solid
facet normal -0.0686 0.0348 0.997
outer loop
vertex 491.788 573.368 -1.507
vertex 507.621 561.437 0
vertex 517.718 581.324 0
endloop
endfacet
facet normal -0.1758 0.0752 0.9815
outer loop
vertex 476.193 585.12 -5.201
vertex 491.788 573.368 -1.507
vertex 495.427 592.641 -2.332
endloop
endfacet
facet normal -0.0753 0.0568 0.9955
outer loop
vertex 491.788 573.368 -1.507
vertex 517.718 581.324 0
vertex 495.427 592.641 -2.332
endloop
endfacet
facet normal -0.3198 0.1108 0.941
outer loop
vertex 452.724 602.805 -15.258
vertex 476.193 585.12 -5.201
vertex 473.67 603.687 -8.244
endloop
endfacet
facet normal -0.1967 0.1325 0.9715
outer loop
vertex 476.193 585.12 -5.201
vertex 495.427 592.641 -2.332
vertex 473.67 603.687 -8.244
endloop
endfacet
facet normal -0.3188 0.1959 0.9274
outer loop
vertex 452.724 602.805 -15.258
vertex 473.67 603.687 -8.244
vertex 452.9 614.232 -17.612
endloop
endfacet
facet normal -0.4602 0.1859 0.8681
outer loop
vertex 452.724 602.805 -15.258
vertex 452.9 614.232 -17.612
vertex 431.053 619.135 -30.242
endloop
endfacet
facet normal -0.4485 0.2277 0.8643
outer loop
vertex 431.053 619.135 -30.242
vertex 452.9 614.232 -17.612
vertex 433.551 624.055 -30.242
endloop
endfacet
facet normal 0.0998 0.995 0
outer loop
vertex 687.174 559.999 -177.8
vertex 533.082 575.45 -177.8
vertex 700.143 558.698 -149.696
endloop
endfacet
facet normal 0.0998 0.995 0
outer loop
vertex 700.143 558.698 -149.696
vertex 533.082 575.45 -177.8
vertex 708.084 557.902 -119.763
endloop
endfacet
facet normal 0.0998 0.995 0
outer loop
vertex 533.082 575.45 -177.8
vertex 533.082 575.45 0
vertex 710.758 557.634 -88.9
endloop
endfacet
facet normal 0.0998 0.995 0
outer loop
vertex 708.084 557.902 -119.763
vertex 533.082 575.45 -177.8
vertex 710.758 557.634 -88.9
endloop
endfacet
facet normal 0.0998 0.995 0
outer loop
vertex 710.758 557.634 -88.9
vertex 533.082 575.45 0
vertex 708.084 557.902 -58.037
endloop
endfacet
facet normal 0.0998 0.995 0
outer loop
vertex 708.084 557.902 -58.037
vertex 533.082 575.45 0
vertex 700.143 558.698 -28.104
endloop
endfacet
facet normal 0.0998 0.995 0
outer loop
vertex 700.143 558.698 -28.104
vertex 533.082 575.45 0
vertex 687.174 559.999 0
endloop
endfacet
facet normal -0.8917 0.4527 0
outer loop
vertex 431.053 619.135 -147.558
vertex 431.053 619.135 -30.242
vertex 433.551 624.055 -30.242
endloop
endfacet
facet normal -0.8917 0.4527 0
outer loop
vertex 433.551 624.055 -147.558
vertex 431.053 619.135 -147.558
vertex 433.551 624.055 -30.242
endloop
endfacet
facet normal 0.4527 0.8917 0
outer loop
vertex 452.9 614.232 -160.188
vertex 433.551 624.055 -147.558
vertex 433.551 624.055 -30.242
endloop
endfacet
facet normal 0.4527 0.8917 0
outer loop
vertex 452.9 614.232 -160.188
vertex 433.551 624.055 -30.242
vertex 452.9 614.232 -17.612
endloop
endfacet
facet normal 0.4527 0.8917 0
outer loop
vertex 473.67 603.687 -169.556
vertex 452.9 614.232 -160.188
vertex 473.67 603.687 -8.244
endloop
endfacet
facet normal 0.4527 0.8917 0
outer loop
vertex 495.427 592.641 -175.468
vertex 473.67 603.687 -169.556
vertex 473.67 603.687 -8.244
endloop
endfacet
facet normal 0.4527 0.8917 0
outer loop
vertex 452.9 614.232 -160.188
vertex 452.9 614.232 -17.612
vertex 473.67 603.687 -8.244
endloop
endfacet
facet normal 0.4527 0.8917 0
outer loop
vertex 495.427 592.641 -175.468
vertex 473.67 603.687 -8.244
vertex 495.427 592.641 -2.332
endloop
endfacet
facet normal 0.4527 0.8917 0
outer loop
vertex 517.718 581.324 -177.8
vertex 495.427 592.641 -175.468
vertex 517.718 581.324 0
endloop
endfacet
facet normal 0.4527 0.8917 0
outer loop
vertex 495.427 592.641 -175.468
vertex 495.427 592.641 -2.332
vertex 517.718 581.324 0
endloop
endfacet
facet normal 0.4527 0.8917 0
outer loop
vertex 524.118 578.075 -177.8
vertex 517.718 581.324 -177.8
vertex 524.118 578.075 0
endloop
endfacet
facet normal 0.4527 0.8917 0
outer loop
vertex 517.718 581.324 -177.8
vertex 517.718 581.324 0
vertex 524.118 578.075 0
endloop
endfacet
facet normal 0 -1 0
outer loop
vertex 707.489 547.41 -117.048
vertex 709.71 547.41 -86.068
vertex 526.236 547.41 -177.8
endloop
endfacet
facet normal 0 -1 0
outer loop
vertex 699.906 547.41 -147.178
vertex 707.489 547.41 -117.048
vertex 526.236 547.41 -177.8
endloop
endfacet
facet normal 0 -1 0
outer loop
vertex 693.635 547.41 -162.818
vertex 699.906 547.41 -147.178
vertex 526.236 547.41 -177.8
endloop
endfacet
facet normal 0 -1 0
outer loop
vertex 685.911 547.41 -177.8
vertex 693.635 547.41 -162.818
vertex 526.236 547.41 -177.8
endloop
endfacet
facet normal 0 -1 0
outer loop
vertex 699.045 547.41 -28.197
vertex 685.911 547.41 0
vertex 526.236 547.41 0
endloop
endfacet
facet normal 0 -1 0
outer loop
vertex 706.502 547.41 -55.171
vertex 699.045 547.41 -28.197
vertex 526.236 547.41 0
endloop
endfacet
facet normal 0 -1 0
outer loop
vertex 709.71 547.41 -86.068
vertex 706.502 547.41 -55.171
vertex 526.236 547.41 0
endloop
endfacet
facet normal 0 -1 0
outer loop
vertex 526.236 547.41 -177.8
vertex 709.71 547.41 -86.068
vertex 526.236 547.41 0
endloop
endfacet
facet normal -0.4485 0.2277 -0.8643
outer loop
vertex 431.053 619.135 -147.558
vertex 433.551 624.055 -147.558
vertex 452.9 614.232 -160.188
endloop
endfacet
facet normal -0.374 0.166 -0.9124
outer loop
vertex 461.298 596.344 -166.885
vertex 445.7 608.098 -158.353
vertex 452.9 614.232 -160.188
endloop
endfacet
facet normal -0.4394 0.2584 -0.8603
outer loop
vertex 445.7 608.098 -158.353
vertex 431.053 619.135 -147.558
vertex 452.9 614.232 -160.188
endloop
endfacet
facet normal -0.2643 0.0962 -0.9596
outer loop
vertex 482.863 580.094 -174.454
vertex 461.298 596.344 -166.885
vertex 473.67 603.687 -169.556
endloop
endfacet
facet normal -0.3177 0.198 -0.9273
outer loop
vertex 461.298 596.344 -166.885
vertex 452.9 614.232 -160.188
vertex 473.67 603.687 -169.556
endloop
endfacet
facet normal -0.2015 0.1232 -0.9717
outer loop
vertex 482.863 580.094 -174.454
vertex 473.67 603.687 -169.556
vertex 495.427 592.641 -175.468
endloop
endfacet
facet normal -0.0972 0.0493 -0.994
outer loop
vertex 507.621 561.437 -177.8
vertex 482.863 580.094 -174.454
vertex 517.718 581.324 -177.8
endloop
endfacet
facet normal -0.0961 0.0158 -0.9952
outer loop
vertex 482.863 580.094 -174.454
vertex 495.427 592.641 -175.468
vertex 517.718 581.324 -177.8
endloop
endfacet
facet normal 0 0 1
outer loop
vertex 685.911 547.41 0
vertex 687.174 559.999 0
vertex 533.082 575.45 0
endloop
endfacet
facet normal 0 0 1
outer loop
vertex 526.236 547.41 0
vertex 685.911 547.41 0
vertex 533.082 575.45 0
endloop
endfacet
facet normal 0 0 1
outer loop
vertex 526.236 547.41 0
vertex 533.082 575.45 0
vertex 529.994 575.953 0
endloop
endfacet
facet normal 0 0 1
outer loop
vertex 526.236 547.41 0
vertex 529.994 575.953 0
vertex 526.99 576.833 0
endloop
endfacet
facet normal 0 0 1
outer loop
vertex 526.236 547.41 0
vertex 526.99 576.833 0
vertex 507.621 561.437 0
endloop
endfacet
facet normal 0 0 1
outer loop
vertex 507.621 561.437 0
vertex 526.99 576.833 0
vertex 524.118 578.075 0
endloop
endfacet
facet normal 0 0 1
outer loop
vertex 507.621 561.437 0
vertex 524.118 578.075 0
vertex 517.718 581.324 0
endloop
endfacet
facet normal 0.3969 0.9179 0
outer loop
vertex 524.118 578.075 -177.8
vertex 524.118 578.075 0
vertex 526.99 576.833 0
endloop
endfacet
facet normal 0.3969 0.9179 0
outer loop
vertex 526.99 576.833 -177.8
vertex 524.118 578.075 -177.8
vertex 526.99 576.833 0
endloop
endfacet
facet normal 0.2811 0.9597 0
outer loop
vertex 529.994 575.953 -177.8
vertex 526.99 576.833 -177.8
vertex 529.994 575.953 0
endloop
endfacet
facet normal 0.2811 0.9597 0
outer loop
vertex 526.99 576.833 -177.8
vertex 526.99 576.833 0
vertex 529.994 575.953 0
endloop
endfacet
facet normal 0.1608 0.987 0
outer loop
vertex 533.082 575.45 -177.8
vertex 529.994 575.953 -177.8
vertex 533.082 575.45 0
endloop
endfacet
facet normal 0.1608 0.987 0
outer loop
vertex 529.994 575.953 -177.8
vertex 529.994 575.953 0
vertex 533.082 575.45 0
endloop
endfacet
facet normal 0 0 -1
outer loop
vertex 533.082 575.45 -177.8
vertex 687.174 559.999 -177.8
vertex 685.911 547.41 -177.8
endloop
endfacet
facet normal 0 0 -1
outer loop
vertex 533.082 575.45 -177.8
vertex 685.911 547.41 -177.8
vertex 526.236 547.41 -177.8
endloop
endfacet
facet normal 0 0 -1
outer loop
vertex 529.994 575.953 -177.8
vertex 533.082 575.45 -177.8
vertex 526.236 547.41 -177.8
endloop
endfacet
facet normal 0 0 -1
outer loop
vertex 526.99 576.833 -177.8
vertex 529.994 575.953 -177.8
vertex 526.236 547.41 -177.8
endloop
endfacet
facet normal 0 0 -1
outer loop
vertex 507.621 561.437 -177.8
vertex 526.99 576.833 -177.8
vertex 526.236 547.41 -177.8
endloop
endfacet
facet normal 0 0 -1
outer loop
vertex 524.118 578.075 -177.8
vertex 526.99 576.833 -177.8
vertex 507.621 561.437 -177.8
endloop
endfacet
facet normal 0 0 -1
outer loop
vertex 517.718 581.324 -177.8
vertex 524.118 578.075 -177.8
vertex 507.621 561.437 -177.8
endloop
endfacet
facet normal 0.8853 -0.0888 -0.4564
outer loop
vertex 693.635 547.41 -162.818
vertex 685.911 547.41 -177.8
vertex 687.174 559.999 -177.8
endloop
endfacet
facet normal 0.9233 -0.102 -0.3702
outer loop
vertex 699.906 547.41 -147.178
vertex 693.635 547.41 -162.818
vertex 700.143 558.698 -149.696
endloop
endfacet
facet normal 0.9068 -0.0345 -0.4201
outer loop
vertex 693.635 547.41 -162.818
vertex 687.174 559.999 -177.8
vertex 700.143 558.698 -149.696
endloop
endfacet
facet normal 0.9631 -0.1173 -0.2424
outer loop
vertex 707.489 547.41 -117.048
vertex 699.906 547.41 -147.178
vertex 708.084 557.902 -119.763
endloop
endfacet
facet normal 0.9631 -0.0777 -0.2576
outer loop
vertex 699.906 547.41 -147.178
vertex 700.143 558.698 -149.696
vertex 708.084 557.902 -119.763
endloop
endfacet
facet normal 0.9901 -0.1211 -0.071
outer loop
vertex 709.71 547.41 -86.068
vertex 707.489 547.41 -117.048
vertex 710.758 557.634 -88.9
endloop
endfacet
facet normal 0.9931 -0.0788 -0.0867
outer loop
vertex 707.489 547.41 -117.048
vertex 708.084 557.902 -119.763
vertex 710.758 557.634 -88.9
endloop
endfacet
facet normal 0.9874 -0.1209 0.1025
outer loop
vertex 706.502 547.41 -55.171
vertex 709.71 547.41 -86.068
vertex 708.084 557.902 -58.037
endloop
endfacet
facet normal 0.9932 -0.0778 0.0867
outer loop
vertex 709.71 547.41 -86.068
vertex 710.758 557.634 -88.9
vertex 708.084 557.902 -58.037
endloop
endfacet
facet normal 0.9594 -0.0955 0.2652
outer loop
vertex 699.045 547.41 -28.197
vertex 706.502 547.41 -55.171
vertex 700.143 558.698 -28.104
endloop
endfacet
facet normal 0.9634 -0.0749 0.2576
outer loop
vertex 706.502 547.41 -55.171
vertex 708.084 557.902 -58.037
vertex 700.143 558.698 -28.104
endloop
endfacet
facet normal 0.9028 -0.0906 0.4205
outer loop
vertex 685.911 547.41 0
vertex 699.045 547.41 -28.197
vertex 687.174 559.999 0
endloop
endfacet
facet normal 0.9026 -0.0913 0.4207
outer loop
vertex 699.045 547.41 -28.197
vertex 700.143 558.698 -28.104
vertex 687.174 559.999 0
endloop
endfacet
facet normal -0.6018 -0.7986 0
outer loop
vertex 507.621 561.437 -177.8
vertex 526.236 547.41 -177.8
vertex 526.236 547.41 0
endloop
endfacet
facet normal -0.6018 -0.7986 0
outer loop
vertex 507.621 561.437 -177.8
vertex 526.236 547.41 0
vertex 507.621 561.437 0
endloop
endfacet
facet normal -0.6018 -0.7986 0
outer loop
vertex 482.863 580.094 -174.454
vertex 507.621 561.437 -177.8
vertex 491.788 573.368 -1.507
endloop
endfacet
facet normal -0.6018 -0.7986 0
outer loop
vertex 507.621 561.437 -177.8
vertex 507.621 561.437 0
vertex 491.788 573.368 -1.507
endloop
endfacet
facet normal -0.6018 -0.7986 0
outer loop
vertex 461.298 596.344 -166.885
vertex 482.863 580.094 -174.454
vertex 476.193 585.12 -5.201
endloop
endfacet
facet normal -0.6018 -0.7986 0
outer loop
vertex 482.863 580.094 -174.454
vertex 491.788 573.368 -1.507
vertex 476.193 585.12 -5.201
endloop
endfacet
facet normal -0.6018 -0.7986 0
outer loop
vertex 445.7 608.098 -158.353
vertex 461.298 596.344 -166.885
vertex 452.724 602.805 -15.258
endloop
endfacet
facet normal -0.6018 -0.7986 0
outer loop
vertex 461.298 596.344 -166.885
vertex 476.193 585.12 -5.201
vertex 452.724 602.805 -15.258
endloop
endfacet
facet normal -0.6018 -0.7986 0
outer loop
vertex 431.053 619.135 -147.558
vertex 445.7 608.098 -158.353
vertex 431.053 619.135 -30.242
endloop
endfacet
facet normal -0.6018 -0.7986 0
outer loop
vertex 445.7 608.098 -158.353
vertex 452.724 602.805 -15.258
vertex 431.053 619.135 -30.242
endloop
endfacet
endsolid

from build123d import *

# Parameters (mm, degrees)
EXTRUDE1_DEPTH = 177.8
EXTRUDE5_DEPTH = 44.45
EXTRUDE6_DEPTH = 44.45


with BuildPart() as part:
    # Sketch1 → Extrude1 (new body)
    with BuildSketch(Plane.XY):
        with BuildLine():
            Line((433.551122257, 624.054848578), (524.118132596, 578.074674098))
            ThreePointArc((524.118132596, 578.074674098), (528.478538405, 576.346602597), (533.082342852, 575.449744447))
            Line((533.082342852, 575.449744447), (710.83449651, 557.626357766))
            Line((710.83449651, 557.626357766), (710.83449651, 547.410087665))
            Line((710.83449651, 547.410087665), (526.236430387, 547.410087665))
            Line((526.236430387, 547.410087665), (431.053198967, 619.134696642))
            Line((431.053198967, 619.134696642), (433.551122257, 624.054848578))
        make_face()
    extrude(amount=-EXTRUDE1_DEPTH)

    # Sketch5 → Extrude5 (cut)
    with BuildSketch(Plane(origin=(62.432960723, 622.642229918, 0), x_dir=(-0.9950104563205879, 0.09977069616222714, 0), z_dir=(0.09977069616222714, 0.9950104563205879, 0))):
        with BuildLine():
            Line((-627.873539531, 0), (-668.145359753, 0))
            Line((-668.145359753, 0), (-668.145359753, -177.8))
            Line((-668.145359753, -177.8), (-627.873539531, -177.8))
            ThreePointArc((-627.873539531, -177.8), (-651.57623812, -88.9), (-627.873539531, 0))
        make_face()
    extrude(amount=-EXTRUDE5_DEPTH, mode=Mode.SUBTRACT)

    # Sketch7 → Extrude6 (cut)
    with BuildSketch(Plane(origin=(340.747990654, 671.170284622, 0), x_dir=(-0.8916667692581813, 0.45269235977723044, 0), z_dir=(0.45269235977723044, 0.8916667692581813, 0))):
        with BuildLine():
            Line((-104.078266458, -30.241656288), (-104.078266458, 0))
            Line((-104.078266458, 0), (-198.470653172, 0))
            ThreePointArc((-198.470653172, 0), (-149.071209803, -8.243889089), (-104.078266458, -30.241656288))
        make_face()
        with BuildLine():
            Line((-104.078266458, -177.8), (-104.078266458, -147.558343712))
            ThreePointArc((-104.078266458, -147.558343712), (-149.071209803, -169.556110911), (-198.470653172, -177.8))
            Line((-198.470653172, -177.8), (-104.078266458, -177.8))
        make_face()
    extrude(amount=-EXTRUDE6_DEPTH, mode=Mode.SUBTRACT)


solid = part.part
